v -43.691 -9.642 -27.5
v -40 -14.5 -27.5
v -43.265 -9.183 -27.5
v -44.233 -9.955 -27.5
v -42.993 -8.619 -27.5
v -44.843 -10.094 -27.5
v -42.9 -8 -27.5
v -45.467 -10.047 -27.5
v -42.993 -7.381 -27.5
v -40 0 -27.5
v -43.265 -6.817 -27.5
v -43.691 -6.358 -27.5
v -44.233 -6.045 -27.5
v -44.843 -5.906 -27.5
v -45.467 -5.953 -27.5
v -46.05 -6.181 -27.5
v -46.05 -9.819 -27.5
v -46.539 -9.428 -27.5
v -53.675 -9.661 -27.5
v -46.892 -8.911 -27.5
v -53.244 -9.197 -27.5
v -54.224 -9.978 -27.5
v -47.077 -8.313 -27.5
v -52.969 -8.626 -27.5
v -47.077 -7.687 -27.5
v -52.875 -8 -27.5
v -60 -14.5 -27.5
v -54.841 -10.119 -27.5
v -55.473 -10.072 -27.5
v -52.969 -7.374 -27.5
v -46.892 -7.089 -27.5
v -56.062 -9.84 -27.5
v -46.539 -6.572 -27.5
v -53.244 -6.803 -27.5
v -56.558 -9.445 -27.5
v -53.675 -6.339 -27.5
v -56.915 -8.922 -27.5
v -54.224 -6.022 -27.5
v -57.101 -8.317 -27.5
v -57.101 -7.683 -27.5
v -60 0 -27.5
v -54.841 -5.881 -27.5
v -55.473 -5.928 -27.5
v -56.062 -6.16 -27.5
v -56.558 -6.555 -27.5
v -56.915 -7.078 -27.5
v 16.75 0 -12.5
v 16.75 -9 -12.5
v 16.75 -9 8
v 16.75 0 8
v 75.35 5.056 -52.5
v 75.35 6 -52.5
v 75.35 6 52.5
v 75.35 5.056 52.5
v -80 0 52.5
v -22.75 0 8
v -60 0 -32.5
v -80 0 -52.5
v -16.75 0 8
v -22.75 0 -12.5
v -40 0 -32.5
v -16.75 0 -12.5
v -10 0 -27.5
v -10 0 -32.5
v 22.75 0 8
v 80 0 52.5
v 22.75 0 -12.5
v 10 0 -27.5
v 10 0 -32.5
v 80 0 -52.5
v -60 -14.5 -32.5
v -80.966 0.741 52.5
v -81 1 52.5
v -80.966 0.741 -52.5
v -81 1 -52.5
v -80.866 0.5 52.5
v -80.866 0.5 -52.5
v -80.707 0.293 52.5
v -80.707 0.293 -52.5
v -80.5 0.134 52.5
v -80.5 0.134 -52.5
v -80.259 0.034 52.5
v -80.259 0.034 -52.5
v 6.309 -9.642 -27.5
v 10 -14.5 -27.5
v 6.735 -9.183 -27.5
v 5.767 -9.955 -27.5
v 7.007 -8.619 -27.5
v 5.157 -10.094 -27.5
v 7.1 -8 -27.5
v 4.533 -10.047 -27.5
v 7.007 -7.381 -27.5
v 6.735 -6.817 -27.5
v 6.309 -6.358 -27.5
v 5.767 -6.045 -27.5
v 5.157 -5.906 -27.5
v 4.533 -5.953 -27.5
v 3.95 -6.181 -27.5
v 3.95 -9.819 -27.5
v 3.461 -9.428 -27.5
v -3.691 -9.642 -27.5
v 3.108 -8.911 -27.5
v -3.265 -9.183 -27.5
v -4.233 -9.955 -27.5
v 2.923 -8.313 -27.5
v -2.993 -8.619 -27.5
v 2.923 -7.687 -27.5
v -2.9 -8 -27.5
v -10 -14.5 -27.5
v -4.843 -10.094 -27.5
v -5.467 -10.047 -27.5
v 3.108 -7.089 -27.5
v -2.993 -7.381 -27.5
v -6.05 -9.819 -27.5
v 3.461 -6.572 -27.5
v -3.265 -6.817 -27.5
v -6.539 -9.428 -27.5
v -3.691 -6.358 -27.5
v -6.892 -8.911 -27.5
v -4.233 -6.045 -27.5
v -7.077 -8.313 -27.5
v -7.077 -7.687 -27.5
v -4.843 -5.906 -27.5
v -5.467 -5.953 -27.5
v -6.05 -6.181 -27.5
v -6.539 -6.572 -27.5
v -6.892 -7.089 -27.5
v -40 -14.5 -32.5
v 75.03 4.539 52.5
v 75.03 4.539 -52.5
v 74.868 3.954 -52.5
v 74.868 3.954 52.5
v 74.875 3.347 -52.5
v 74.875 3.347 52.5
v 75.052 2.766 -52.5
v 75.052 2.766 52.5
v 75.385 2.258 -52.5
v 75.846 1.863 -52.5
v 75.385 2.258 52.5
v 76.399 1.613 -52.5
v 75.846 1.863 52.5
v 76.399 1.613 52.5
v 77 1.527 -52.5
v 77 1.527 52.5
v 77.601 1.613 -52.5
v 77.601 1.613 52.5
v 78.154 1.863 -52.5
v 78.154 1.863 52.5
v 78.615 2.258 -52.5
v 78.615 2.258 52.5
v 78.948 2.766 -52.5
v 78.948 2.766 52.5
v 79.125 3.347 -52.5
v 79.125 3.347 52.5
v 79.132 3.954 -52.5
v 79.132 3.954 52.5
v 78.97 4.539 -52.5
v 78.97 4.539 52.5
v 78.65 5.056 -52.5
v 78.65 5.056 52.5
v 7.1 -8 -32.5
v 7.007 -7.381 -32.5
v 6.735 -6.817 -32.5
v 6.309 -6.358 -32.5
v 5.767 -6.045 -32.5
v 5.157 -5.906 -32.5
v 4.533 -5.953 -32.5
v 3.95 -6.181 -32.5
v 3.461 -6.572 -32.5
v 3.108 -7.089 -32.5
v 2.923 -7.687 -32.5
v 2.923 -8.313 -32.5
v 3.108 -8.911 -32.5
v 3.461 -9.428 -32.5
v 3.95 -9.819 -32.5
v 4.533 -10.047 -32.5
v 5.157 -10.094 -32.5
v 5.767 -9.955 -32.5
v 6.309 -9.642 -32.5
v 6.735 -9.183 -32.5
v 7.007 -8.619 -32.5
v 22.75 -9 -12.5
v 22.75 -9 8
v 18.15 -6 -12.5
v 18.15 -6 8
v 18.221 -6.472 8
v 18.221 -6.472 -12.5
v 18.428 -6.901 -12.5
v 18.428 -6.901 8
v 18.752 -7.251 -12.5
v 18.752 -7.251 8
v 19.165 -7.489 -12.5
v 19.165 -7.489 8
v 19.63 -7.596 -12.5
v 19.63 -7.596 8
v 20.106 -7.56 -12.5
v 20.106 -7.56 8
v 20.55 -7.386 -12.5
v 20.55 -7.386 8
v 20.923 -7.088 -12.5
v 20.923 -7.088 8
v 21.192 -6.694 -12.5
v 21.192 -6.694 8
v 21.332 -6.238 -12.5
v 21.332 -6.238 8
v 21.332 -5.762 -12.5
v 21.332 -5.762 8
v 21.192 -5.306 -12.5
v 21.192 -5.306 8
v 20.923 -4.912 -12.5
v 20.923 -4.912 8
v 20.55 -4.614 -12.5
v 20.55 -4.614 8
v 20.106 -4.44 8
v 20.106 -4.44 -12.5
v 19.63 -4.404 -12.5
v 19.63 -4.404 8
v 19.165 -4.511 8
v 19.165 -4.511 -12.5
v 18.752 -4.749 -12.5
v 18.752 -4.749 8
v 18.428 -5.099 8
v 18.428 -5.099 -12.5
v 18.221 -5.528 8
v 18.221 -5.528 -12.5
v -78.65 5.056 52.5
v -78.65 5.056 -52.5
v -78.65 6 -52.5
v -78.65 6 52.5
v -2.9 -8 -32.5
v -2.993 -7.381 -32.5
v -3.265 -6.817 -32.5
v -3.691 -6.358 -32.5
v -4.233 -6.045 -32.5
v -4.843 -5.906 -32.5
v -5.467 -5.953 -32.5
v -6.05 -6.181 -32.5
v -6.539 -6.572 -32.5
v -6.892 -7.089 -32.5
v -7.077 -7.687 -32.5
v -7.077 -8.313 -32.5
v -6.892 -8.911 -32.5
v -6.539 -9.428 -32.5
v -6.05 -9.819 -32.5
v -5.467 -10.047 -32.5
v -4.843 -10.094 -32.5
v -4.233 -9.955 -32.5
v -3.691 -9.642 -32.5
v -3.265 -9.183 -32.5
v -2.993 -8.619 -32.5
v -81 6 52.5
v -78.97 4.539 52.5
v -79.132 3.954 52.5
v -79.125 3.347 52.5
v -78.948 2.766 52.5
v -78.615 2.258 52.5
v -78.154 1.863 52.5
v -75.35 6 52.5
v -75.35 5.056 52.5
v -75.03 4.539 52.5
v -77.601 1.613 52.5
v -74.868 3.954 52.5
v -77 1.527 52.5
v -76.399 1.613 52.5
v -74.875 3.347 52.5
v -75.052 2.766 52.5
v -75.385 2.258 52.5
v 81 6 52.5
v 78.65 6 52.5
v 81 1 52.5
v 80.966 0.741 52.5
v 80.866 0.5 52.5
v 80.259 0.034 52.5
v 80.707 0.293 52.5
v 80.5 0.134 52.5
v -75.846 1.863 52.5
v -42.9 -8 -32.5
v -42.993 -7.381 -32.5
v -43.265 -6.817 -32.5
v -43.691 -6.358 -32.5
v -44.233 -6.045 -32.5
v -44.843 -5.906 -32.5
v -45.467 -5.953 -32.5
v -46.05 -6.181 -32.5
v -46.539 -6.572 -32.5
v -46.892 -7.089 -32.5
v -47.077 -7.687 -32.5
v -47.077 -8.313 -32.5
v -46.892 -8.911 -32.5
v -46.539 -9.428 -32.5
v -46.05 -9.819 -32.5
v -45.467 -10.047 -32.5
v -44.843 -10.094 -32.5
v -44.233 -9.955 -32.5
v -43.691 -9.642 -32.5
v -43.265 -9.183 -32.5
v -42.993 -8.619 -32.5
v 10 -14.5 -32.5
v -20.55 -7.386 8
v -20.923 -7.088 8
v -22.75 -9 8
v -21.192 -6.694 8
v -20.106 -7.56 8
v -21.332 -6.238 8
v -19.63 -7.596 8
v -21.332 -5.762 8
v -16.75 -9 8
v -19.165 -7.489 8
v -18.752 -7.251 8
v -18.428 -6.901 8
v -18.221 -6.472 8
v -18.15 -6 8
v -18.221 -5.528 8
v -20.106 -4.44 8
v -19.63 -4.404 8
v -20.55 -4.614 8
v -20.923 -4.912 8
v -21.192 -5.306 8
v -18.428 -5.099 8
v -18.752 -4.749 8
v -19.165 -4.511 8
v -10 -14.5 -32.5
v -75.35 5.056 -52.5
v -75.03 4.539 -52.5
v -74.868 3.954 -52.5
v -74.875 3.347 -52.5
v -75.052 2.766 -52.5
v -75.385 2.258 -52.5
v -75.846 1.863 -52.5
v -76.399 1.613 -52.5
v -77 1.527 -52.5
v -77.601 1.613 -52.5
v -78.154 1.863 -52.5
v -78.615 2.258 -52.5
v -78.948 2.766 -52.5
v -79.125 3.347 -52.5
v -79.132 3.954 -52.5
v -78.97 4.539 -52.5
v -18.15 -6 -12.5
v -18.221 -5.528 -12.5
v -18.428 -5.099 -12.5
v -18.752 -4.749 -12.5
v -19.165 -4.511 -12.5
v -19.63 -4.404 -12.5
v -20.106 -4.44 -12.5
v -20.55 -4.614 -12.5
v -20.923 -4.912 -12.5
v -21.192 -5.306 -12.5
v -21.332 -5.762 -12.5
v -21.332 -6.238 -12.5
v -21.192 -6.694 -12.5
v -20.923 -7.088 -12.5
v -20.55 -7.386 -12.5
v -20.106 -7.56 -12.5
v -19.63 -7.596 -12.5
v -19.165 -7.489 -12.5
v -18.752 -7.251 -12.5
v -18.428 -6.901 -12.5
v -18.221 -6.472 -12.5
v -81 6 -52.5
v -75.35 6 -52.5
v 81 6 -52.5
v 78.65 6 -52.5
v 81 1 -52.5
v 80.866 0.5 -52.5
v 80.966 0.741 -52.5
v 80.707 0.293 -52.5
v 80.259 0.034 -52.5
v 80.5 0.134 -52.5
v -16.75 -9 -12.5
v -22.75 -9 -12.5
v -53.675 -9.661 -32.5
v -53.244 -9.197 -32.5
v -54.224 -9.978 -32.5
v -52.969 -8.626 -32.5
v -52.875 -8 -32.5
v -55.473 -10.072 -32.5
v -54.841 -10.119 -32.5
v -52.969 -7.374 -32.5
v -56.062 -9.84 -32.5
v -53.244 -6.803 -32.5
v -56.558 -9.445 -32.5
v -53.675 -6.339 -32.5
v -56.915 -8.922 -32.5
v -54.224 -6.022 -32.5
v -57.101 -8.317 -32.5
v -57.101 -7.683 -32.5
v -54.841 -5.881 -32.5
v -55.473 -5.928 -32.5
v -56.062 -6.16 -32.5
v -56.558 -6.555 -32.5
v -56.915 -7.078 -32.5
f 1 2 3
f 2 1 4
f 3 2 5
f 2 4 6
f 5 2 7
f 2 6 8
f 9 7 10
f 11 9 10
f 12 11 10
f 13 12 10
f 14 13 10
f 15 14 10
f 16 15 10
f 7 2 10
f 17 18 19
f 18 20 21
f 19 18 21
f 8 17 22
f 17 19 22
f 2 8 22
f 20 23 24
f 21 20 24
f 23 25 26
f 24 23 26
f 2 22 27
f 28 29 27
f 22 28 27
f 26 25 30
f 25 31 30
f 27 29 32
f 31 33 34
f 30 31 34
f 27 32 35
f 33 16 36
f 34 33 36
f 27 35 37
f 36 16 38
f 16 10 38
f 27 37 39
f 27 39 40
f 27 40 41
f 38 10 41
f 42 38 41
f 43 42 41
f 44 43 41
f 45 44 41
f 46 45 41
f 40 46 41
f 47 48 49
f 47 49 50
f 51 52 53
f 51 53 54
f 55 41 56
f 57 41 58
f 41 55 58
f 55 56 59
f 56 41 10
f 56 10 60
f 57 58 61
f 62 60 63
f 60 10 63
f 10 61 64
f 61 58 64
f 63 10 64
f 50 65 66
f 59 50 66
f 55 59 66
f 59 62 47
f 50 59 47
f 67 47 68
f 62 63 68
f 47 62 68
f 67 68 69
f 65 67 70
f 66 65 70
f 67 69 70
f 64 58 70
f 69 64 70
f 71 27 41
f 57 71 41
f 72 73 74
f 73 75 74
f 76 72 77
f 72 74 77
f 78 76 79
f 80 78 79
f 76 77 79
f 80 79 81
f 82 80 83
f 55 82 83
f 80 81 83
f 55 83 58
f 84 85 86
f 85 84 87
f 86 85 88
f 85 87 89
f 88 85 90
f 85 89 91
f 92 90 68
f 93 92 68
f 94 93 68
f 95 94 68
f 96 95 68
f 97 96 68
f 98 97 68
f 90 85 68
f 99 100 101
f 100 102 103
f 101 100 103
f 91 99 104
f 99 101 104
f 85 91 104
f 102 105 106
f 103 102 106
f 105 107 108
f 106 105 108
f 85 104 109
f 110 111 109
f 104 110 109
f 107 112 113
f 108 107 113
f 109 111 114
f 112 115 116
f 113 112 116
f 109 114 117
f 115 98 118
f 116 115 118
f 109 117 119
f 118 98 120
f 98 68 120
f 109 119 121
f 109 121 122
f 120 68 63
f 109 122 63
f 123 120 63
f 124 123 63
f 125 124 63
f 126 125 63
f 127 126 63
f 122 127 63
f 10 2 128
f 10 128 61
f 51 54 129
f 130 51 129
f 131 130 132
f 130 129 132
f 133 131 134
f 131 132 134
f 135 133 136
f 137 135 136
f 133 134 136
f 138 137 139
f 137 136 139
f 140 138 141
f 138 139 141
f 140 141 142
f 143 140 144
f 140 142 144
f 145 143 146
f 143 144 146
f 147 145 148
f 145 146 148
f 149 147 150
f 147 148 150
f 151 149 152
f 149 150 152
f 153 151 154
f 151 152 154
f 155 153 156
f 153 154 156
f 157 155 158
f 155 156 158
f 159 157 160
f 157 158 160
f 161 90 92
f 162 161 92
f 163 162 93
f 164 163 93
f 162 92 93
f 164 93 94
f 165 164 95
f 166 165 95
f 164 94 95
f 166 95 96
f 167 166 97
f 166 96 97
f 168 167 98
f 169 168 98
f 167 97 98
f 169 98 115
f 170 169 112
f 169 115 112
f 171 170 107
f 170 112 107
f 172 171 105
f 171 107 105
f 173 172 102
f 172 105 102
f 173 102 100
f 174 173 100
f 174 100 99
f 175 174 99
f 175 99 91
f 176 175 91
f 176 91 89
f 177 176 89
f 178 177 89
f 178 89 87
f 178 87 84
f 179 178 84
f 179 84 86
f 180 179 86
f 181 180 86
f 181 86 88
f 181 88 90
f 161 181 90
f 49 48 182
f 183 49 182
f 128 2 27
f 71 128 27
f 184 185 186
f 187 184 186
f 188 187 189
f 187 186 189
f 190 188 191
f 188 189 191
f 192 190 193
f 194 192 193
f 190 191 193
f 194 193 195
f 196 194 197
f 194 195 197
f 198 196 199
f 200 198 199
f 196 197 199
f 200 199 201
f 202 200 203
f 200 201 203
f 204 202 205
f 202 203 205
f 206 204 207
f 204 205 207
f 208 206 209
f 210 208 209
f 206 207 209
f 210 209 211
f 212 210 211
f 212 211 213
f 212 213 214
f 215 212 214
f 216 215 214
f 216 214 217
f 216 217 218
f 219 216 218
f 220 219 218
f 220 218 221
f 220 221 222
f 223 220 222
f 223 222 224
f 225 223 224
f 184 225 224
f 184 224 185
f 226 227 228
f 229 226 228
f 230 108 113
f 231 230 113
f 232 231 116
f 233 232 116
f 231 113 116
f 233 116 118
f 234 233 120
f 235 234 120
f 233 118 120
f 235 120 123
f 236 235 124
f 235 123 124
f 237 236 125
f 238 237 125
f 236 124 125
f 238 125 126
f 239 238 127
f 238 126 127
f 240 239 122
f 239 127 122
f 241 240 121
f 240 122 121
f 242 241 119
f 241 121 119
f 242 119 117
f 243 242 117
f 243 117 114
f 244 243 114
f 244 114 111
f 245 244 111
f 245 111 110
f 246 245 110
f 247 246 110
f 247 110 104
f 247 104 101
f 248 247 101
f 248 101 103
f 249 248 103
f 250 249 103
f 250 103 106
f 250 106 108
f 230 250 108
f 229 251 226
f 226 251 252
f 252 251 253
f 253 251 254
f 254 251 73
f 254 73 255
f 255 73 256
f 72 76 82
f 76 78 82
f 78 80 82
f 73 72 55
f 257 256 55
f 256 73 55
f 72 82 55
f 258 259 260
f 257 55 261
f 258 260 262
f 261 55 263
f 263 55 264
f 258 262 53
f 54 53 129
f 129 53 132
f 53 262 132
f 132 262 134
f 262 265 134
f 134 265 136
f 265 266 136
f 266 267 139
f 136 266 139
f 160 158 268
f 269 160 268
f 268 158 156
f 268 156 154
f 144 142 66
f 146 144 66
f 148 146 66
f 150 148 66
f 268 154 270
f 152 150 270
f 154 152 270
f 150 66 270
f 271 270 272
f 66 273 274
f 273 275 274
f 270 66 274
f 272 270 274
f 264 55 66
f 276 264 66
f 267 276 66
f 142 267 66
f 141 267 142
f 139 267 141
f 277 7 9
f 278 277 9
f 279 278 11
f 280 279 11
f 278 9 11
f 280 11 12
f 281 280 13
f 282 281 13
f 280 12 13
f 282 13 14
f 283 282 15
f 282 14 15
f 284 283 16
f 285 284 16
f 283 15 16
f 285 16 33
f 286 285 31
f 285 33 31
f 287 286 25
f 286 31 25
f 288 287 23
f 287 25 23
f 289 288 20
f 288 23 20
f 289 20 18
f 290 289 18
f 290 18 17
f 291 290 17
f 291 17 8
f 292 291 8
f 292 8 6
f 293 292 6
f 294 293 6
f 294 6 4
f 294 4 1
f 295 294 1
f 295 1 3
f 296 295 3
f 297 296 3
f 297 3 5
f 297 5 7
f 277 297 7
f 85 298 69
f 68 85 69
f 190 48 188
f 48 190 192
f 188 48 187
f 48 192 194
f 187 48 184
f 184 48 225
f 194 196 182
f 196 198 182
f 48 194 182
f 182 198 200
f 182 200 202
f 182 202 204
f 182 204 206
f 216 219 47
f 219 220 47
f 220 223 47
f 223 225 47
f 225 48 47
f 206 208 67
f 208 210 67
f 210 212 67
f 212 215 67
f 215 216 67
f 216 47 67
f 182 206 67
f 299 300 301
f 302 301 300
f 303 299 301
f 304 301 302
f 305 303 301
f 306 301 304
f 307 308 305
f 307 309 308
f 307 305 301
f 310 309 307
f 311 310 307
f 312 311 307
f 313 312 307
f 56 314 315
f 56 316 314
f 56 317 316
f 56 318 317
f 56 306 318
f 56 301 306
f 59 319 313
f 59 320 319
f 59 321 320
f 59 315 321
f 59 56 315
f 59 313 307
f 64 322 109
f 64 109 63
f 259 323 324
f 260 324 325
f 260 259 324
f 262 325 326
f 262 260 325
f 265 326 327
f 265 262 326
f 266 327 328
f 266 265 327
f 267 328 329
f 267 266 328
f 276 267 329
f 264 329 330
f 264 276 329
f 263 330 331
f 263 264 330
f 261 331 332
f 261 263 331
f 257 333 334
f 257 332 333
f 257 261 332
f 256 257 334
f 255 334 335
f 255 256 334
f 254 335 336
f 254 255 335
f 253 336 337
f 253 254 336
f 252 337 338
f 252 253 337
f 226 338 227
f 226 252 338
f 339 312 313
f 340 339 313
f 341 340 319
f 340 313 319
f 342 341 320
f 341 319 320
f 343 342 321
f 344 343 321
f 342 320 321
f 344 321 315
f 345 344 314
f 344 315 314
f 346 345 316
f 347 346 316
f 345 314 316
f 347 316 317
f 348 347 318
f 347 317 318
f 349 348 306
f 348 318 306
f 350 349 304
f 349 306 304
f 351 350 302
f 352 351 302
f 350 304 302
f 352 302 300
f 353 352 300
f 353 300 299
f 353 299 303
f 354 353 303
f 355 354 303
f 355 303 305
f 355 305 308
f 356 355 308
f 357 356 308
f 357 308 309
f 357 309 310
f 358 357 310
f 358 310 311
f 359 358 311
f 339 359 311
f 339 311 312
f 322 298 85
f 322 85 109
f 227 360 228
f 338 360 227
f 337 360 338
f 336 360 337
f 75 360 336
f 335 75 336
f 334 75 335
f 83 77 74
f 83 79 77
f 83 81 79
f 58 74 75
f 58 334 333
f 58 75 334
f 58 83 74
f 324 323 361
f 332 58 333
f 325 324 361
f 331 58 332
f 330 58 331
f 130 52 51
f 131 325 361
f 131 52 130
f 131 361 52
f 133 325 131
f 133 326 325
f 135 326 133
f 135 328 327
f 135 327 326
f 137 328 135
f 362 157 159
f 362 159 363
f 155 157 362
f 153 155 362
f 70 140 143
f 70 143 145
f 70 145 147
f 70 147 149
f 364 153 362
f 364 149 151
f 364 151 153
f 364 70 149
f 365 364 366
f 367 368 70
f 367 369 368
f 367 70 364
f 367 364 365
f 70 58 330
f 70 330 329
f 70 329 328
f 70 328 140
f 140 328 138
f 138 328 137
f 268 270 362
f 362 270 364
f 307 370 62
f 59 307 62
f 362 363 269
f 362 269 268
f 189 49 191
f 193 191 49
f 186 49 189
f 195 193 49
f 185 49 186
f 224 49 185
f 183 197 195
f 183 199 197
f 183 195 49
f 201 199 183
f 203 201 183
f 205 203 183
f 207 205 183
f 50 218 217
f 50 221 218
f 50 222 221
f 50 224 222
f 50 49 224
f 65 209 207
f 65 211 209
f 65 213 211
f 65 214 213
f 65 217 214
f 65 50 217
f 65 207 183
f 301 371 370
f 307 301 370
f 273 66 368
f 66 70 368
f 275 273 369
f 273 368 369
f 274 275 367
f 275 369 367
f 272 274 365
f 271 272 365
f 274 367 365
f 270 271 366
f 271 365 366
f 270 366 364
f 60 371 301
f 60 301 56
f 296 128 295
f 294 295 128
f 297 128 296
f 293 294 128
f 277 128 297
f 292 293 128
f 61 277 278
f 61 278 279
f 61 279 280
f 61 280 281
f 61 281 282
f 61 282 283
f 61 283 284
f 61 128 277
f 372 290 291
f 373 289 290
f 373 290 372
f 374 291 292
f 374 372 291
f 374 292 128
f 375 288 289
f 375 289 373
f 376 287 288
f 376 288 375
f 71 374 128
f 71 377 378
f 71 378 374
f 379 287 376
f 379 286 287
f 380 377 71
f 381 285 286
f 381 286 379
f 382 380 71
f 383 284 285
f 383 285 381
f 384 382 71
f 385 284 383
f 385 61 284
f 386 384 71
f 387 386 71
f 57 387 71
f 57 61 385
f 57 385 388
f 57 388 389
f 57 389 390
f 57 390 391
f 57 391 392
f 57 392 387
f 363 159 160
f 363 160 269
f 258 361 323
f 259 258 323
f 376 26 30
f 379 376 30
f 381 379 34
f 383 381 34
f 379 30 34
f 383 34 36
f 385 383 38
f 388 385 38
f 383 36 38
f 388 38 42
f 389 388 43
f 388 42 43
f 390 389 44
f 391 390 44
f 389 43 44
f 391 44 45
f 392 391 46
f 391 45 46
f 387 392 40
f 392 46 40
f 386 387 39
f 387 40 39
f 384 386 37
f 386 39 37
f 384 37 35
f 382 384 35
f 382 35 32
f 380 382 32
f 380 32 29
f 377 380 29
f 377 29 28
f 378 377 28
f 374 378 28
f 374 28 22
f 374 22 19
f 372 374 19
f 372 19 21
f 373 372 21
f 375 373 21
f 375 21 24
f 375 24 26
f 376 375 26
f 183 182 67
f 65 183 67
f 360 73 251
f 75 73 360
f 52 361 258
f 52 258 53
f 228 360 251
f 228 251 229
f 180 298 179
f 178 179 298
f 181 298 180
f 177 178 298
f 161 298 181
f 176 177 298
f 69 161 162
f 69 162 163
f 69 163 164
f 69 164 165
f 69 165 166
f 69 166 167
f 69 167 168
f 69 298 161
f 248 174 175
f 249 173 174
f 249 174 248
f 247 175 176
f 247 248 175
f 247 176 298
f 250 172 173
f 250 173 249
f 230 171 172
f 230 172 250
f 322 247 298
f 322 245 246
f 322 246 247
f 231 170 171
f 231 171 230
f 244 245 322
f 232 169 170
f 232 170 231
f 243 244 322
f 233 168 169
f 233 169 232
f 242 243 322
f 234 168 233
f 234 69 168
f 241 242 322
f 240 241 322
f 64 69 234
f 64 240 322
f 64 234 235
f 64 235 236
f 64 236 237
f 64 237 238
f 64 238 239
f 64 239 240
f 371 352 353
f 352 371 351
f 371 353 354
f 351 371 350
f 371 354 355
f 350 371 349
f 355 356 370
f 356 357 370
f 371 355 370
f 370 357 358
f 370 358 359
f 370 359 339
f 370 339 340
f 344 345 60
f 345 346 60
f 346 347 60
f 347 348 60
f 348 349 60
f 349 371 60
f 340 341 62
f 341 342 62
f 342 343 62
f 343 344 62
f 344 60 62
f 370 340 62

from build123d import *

# Parameters (mm, degrees)
SKETCH_1_W            = 162
SKETCH_1_H            = 105
EXTRUDE_1_DEPTH       = 6
CUT_EXTRUDE_1_DEPTH   = 133.747881339
FILLET_1_R            = 1
EXTRUDE_START         = -20
SKETCH_4_W            = 20
SKETCH_4_H            = 14.5
EXTRUDE_2_DEPTH       = 5
F_4_0MM_1_D           = 4
F_4_0MM_1_CSINK_D     = 4.05
F_4_0MM_1_CSINK_ANGLE = 90
EXTRUDE_START_2       = 15
SKETCH_7_W            = 6
SKETCH_7_H            = 9
EXTRUDE_3_DEPTH       = 20.5
SKETCH_8_R            = 1.5
CUT_EXTRUDE_2_DEPTH   = 103.13471496
CUT_EXTRUDE_3_DEPTH   = 134.402586182
EXTRUDE_START_3       = -5
SKETCH_10_W           = 20
SKETCH_10_H           = 14.5
SKETCH_10_R           = 2.025
SKETCH_10_R_2         = 2
EXTRUDE_4_DEPTH       = 5
SKETCH_12_R           = 2.1
SKETCH_12_R_2         = 2.125
SKETCH_12_R_3         = 1.6
CUT_EXTRUDE_4_DEPTH   = 134.402586182


with BuildPart() as part:
    # 草圖1 → 填料-伸長1 (new body)
    with BuildSketch(Plane(origin=(0, 0, 0), x_dir=(1, 0, 0), z_dir=(0, 1, 0))):
        Rectangle(SKETCH_1_W, SKETCH_1_H)
    extrude(amount=EXTRUDE_1_DEPTH)

    # 草圖3 → 除料-伸長1 (cut, through all)
    with BuildSketch(Plane.XY.offset(52.5)):
        with BuildLine():
            Line((75.5, 5), (75.5, 6))
            Line((75.5, 6), (78.5, 6))
            Line((78.5, 6), (78.5, 5))
            ThreePointArc((78.5, 5), (77, 1.677124344), (75.5, 5))
        make_face()
    cut_extrude_1 = extrude(amount=-CUT_EXTRUDE_1_DEPTH, mode=Mode.SUBTRACT)

    # 鏡射1: 除料-伸長1 across plane
    add(cut_extrude_1.mirror(Plane(origin=(0, 0, 0), x_dir=(0, 0, 1), z_dir=(1, 0, 0))), mode=Mode.SUBTRACT)

    # 圓角1
    fillet_1_edges = [part.edges().sort_by_distance(p)[0] for p in [
        (81, 0, 0),
        (-81, 0, 0),
    ]]
    fillet(fillet_1_edges, radius=FILLET_1_R)

    # 草圖4 → 填料-伸長2 (add)
    with BuildSketch(Plane(origin=(0, 0, -52.5), x_dir=(-1, 0, 0), z_dir=(0, 0, -1)).offset(EXTRUDE_START)):
        with Locations((0, -7.25)):
            Rectangle(SKETCH_4_W, SKETCH_4_H)
    extrude(amount=-EXTRUDE_2_DEPTH)

    # Ø4.0mm 定位孔1 (through all)
    with Locations(Plane(origin=(0, 0, -32.5), x_dir=(-1, 0, 0), z_dir=(0, 0, -1))):
        with Locations((5, -8), (-5, -8)):
            CounterSinkHole(F_4_0MM_1_D / 2, F_4_0MM_1_CSINK_D / 2, counter_sink_angle=F_4_0MM_1_CSINK_ANGLE)

    # 草圖7 → 填料-伸長3 (add)
    with BuildSketch(Plane.XY.offset(-27.5).offset(EXTRUDE_START_2)):
        with Locations((19.75, -4.5)):
            Rectangle(SKETCH_7_W, SKETCH_7_H)
        with Locations((-19.75, -4.5)):
            Rectangle(SKETCH_7_W, SKETCH_7_H)
    extrude(amount=EXTRUDE_3_DEPTH)

    # 草圖8 → 除料-伸長2 (cut, through all)
    with BuildSketch(Plane.XY.offset(8)):
        with Locations((-19.75, -6)):
            Circle(SKETCH_8_R)
        with Locations((19.75, -6)):
            Circle(SKETCH_8_R)
    extrude(amount=-CUT_EXTRUDE_2_DEPTH, mode=Mode.SUBTRACT)

    # 草圖9 → 除料-伸長3 (cut, through all)
    with BuildSketch(Plane.XY.offset(52.5)):
        with BuildLine():
            Line((-78.65, 6), (-75.35, 6))
            Line((-75.35, 6), (-75.35, 5.05552922))
            ThreePointArc((-75.35, 5.05552922), (-77, 1.527124344), (-78.65, 5.05552922))
            Line((-78.65, 5.05552922), (-78.65, 6))
        make_face()
        with BuildLine():
            Line((78.65, 5.05552922), (78.65, 6))
            Line((78.65, 6), (75.35, 6))
            Line((75.35, 6), (75.35, 5.05552922))
            ThreePointArc((75.35, 5.05552922), (77, 1.527124344), (78.65, 5.05552922))
        make_face()
    extrude(amount=-CUT_EXTRUDE_3_DEPTH, mode=Mode.SUBTRACT)

    # 草圖10 → 填料-伸長4 (add)
    # profile 1 of 2: a face of its own
    with BuildSketch(Plane(origin=(0, 0, -32.5), x_dir=(-1, 0, 0), z_dir=(0, 0, -1)).offset(EXTRUDE_START_3)):
        with Locations((0, -7.25)):
            Rectangle(SKETCH_10_W, SKETCH_10_H)
        with Locations((5, -8)):
            Circle(SKETCH_10_R, mode=Mode.SUBTRACT)
        with Locations((-5, -8)):
            Circle(SKETCH_10_R_2, mode=Mode.SUBTRACT)
    # profile 2 of 2: a face of its own
    with BuildSketch(Plane(origin=(0, 0, -32.5), x_dir=(-1, 0, 0), z_dir=(0, 0, -1)).offset(EXTRUDE_START_3)):
        with Locations((50, -7.25)):
            Rectangle(SKETCH_10_W, SKETCH_10_H)
        with Locations((55, -8)):
            Circle(SKETCH_10_R, mode=Mode.SUBTRACT)
        with Locations((45, -8)):
            Circle(SKETCH_10_R_2, mode=Mode.SUBTRACT)
    extrude(amount=EXTRUDE_4_DEPTH)

    # 草圖12 → 除料-伸長4 (cut, through all)
    with BuildSketch(Plane.XY.offset(52.5)):
        with Locations((-45, -8)):
            Circle(SKETCH_12_R)
        with Locations((-55, -8)):
            Circle(SKETCH_12_R_2)
        with Locations((-19.75, -6)):
            Circle(SKETCH_12_R_3)
        with Locations((-5, -8)):
            Circle(SKETCH_12_R)
        with Locations((5, -8)):
            Circle(SKETCH_12_R)
        with Locations(Location((19.75, -6, 0), (0, 0, 180))):
            Circle(SKETCH_12_R_3)
    extrude(amount=-CUT_EXTRUDE_4_DEPTH, mode=Mode.SUBTRACT)


solid = part.part
